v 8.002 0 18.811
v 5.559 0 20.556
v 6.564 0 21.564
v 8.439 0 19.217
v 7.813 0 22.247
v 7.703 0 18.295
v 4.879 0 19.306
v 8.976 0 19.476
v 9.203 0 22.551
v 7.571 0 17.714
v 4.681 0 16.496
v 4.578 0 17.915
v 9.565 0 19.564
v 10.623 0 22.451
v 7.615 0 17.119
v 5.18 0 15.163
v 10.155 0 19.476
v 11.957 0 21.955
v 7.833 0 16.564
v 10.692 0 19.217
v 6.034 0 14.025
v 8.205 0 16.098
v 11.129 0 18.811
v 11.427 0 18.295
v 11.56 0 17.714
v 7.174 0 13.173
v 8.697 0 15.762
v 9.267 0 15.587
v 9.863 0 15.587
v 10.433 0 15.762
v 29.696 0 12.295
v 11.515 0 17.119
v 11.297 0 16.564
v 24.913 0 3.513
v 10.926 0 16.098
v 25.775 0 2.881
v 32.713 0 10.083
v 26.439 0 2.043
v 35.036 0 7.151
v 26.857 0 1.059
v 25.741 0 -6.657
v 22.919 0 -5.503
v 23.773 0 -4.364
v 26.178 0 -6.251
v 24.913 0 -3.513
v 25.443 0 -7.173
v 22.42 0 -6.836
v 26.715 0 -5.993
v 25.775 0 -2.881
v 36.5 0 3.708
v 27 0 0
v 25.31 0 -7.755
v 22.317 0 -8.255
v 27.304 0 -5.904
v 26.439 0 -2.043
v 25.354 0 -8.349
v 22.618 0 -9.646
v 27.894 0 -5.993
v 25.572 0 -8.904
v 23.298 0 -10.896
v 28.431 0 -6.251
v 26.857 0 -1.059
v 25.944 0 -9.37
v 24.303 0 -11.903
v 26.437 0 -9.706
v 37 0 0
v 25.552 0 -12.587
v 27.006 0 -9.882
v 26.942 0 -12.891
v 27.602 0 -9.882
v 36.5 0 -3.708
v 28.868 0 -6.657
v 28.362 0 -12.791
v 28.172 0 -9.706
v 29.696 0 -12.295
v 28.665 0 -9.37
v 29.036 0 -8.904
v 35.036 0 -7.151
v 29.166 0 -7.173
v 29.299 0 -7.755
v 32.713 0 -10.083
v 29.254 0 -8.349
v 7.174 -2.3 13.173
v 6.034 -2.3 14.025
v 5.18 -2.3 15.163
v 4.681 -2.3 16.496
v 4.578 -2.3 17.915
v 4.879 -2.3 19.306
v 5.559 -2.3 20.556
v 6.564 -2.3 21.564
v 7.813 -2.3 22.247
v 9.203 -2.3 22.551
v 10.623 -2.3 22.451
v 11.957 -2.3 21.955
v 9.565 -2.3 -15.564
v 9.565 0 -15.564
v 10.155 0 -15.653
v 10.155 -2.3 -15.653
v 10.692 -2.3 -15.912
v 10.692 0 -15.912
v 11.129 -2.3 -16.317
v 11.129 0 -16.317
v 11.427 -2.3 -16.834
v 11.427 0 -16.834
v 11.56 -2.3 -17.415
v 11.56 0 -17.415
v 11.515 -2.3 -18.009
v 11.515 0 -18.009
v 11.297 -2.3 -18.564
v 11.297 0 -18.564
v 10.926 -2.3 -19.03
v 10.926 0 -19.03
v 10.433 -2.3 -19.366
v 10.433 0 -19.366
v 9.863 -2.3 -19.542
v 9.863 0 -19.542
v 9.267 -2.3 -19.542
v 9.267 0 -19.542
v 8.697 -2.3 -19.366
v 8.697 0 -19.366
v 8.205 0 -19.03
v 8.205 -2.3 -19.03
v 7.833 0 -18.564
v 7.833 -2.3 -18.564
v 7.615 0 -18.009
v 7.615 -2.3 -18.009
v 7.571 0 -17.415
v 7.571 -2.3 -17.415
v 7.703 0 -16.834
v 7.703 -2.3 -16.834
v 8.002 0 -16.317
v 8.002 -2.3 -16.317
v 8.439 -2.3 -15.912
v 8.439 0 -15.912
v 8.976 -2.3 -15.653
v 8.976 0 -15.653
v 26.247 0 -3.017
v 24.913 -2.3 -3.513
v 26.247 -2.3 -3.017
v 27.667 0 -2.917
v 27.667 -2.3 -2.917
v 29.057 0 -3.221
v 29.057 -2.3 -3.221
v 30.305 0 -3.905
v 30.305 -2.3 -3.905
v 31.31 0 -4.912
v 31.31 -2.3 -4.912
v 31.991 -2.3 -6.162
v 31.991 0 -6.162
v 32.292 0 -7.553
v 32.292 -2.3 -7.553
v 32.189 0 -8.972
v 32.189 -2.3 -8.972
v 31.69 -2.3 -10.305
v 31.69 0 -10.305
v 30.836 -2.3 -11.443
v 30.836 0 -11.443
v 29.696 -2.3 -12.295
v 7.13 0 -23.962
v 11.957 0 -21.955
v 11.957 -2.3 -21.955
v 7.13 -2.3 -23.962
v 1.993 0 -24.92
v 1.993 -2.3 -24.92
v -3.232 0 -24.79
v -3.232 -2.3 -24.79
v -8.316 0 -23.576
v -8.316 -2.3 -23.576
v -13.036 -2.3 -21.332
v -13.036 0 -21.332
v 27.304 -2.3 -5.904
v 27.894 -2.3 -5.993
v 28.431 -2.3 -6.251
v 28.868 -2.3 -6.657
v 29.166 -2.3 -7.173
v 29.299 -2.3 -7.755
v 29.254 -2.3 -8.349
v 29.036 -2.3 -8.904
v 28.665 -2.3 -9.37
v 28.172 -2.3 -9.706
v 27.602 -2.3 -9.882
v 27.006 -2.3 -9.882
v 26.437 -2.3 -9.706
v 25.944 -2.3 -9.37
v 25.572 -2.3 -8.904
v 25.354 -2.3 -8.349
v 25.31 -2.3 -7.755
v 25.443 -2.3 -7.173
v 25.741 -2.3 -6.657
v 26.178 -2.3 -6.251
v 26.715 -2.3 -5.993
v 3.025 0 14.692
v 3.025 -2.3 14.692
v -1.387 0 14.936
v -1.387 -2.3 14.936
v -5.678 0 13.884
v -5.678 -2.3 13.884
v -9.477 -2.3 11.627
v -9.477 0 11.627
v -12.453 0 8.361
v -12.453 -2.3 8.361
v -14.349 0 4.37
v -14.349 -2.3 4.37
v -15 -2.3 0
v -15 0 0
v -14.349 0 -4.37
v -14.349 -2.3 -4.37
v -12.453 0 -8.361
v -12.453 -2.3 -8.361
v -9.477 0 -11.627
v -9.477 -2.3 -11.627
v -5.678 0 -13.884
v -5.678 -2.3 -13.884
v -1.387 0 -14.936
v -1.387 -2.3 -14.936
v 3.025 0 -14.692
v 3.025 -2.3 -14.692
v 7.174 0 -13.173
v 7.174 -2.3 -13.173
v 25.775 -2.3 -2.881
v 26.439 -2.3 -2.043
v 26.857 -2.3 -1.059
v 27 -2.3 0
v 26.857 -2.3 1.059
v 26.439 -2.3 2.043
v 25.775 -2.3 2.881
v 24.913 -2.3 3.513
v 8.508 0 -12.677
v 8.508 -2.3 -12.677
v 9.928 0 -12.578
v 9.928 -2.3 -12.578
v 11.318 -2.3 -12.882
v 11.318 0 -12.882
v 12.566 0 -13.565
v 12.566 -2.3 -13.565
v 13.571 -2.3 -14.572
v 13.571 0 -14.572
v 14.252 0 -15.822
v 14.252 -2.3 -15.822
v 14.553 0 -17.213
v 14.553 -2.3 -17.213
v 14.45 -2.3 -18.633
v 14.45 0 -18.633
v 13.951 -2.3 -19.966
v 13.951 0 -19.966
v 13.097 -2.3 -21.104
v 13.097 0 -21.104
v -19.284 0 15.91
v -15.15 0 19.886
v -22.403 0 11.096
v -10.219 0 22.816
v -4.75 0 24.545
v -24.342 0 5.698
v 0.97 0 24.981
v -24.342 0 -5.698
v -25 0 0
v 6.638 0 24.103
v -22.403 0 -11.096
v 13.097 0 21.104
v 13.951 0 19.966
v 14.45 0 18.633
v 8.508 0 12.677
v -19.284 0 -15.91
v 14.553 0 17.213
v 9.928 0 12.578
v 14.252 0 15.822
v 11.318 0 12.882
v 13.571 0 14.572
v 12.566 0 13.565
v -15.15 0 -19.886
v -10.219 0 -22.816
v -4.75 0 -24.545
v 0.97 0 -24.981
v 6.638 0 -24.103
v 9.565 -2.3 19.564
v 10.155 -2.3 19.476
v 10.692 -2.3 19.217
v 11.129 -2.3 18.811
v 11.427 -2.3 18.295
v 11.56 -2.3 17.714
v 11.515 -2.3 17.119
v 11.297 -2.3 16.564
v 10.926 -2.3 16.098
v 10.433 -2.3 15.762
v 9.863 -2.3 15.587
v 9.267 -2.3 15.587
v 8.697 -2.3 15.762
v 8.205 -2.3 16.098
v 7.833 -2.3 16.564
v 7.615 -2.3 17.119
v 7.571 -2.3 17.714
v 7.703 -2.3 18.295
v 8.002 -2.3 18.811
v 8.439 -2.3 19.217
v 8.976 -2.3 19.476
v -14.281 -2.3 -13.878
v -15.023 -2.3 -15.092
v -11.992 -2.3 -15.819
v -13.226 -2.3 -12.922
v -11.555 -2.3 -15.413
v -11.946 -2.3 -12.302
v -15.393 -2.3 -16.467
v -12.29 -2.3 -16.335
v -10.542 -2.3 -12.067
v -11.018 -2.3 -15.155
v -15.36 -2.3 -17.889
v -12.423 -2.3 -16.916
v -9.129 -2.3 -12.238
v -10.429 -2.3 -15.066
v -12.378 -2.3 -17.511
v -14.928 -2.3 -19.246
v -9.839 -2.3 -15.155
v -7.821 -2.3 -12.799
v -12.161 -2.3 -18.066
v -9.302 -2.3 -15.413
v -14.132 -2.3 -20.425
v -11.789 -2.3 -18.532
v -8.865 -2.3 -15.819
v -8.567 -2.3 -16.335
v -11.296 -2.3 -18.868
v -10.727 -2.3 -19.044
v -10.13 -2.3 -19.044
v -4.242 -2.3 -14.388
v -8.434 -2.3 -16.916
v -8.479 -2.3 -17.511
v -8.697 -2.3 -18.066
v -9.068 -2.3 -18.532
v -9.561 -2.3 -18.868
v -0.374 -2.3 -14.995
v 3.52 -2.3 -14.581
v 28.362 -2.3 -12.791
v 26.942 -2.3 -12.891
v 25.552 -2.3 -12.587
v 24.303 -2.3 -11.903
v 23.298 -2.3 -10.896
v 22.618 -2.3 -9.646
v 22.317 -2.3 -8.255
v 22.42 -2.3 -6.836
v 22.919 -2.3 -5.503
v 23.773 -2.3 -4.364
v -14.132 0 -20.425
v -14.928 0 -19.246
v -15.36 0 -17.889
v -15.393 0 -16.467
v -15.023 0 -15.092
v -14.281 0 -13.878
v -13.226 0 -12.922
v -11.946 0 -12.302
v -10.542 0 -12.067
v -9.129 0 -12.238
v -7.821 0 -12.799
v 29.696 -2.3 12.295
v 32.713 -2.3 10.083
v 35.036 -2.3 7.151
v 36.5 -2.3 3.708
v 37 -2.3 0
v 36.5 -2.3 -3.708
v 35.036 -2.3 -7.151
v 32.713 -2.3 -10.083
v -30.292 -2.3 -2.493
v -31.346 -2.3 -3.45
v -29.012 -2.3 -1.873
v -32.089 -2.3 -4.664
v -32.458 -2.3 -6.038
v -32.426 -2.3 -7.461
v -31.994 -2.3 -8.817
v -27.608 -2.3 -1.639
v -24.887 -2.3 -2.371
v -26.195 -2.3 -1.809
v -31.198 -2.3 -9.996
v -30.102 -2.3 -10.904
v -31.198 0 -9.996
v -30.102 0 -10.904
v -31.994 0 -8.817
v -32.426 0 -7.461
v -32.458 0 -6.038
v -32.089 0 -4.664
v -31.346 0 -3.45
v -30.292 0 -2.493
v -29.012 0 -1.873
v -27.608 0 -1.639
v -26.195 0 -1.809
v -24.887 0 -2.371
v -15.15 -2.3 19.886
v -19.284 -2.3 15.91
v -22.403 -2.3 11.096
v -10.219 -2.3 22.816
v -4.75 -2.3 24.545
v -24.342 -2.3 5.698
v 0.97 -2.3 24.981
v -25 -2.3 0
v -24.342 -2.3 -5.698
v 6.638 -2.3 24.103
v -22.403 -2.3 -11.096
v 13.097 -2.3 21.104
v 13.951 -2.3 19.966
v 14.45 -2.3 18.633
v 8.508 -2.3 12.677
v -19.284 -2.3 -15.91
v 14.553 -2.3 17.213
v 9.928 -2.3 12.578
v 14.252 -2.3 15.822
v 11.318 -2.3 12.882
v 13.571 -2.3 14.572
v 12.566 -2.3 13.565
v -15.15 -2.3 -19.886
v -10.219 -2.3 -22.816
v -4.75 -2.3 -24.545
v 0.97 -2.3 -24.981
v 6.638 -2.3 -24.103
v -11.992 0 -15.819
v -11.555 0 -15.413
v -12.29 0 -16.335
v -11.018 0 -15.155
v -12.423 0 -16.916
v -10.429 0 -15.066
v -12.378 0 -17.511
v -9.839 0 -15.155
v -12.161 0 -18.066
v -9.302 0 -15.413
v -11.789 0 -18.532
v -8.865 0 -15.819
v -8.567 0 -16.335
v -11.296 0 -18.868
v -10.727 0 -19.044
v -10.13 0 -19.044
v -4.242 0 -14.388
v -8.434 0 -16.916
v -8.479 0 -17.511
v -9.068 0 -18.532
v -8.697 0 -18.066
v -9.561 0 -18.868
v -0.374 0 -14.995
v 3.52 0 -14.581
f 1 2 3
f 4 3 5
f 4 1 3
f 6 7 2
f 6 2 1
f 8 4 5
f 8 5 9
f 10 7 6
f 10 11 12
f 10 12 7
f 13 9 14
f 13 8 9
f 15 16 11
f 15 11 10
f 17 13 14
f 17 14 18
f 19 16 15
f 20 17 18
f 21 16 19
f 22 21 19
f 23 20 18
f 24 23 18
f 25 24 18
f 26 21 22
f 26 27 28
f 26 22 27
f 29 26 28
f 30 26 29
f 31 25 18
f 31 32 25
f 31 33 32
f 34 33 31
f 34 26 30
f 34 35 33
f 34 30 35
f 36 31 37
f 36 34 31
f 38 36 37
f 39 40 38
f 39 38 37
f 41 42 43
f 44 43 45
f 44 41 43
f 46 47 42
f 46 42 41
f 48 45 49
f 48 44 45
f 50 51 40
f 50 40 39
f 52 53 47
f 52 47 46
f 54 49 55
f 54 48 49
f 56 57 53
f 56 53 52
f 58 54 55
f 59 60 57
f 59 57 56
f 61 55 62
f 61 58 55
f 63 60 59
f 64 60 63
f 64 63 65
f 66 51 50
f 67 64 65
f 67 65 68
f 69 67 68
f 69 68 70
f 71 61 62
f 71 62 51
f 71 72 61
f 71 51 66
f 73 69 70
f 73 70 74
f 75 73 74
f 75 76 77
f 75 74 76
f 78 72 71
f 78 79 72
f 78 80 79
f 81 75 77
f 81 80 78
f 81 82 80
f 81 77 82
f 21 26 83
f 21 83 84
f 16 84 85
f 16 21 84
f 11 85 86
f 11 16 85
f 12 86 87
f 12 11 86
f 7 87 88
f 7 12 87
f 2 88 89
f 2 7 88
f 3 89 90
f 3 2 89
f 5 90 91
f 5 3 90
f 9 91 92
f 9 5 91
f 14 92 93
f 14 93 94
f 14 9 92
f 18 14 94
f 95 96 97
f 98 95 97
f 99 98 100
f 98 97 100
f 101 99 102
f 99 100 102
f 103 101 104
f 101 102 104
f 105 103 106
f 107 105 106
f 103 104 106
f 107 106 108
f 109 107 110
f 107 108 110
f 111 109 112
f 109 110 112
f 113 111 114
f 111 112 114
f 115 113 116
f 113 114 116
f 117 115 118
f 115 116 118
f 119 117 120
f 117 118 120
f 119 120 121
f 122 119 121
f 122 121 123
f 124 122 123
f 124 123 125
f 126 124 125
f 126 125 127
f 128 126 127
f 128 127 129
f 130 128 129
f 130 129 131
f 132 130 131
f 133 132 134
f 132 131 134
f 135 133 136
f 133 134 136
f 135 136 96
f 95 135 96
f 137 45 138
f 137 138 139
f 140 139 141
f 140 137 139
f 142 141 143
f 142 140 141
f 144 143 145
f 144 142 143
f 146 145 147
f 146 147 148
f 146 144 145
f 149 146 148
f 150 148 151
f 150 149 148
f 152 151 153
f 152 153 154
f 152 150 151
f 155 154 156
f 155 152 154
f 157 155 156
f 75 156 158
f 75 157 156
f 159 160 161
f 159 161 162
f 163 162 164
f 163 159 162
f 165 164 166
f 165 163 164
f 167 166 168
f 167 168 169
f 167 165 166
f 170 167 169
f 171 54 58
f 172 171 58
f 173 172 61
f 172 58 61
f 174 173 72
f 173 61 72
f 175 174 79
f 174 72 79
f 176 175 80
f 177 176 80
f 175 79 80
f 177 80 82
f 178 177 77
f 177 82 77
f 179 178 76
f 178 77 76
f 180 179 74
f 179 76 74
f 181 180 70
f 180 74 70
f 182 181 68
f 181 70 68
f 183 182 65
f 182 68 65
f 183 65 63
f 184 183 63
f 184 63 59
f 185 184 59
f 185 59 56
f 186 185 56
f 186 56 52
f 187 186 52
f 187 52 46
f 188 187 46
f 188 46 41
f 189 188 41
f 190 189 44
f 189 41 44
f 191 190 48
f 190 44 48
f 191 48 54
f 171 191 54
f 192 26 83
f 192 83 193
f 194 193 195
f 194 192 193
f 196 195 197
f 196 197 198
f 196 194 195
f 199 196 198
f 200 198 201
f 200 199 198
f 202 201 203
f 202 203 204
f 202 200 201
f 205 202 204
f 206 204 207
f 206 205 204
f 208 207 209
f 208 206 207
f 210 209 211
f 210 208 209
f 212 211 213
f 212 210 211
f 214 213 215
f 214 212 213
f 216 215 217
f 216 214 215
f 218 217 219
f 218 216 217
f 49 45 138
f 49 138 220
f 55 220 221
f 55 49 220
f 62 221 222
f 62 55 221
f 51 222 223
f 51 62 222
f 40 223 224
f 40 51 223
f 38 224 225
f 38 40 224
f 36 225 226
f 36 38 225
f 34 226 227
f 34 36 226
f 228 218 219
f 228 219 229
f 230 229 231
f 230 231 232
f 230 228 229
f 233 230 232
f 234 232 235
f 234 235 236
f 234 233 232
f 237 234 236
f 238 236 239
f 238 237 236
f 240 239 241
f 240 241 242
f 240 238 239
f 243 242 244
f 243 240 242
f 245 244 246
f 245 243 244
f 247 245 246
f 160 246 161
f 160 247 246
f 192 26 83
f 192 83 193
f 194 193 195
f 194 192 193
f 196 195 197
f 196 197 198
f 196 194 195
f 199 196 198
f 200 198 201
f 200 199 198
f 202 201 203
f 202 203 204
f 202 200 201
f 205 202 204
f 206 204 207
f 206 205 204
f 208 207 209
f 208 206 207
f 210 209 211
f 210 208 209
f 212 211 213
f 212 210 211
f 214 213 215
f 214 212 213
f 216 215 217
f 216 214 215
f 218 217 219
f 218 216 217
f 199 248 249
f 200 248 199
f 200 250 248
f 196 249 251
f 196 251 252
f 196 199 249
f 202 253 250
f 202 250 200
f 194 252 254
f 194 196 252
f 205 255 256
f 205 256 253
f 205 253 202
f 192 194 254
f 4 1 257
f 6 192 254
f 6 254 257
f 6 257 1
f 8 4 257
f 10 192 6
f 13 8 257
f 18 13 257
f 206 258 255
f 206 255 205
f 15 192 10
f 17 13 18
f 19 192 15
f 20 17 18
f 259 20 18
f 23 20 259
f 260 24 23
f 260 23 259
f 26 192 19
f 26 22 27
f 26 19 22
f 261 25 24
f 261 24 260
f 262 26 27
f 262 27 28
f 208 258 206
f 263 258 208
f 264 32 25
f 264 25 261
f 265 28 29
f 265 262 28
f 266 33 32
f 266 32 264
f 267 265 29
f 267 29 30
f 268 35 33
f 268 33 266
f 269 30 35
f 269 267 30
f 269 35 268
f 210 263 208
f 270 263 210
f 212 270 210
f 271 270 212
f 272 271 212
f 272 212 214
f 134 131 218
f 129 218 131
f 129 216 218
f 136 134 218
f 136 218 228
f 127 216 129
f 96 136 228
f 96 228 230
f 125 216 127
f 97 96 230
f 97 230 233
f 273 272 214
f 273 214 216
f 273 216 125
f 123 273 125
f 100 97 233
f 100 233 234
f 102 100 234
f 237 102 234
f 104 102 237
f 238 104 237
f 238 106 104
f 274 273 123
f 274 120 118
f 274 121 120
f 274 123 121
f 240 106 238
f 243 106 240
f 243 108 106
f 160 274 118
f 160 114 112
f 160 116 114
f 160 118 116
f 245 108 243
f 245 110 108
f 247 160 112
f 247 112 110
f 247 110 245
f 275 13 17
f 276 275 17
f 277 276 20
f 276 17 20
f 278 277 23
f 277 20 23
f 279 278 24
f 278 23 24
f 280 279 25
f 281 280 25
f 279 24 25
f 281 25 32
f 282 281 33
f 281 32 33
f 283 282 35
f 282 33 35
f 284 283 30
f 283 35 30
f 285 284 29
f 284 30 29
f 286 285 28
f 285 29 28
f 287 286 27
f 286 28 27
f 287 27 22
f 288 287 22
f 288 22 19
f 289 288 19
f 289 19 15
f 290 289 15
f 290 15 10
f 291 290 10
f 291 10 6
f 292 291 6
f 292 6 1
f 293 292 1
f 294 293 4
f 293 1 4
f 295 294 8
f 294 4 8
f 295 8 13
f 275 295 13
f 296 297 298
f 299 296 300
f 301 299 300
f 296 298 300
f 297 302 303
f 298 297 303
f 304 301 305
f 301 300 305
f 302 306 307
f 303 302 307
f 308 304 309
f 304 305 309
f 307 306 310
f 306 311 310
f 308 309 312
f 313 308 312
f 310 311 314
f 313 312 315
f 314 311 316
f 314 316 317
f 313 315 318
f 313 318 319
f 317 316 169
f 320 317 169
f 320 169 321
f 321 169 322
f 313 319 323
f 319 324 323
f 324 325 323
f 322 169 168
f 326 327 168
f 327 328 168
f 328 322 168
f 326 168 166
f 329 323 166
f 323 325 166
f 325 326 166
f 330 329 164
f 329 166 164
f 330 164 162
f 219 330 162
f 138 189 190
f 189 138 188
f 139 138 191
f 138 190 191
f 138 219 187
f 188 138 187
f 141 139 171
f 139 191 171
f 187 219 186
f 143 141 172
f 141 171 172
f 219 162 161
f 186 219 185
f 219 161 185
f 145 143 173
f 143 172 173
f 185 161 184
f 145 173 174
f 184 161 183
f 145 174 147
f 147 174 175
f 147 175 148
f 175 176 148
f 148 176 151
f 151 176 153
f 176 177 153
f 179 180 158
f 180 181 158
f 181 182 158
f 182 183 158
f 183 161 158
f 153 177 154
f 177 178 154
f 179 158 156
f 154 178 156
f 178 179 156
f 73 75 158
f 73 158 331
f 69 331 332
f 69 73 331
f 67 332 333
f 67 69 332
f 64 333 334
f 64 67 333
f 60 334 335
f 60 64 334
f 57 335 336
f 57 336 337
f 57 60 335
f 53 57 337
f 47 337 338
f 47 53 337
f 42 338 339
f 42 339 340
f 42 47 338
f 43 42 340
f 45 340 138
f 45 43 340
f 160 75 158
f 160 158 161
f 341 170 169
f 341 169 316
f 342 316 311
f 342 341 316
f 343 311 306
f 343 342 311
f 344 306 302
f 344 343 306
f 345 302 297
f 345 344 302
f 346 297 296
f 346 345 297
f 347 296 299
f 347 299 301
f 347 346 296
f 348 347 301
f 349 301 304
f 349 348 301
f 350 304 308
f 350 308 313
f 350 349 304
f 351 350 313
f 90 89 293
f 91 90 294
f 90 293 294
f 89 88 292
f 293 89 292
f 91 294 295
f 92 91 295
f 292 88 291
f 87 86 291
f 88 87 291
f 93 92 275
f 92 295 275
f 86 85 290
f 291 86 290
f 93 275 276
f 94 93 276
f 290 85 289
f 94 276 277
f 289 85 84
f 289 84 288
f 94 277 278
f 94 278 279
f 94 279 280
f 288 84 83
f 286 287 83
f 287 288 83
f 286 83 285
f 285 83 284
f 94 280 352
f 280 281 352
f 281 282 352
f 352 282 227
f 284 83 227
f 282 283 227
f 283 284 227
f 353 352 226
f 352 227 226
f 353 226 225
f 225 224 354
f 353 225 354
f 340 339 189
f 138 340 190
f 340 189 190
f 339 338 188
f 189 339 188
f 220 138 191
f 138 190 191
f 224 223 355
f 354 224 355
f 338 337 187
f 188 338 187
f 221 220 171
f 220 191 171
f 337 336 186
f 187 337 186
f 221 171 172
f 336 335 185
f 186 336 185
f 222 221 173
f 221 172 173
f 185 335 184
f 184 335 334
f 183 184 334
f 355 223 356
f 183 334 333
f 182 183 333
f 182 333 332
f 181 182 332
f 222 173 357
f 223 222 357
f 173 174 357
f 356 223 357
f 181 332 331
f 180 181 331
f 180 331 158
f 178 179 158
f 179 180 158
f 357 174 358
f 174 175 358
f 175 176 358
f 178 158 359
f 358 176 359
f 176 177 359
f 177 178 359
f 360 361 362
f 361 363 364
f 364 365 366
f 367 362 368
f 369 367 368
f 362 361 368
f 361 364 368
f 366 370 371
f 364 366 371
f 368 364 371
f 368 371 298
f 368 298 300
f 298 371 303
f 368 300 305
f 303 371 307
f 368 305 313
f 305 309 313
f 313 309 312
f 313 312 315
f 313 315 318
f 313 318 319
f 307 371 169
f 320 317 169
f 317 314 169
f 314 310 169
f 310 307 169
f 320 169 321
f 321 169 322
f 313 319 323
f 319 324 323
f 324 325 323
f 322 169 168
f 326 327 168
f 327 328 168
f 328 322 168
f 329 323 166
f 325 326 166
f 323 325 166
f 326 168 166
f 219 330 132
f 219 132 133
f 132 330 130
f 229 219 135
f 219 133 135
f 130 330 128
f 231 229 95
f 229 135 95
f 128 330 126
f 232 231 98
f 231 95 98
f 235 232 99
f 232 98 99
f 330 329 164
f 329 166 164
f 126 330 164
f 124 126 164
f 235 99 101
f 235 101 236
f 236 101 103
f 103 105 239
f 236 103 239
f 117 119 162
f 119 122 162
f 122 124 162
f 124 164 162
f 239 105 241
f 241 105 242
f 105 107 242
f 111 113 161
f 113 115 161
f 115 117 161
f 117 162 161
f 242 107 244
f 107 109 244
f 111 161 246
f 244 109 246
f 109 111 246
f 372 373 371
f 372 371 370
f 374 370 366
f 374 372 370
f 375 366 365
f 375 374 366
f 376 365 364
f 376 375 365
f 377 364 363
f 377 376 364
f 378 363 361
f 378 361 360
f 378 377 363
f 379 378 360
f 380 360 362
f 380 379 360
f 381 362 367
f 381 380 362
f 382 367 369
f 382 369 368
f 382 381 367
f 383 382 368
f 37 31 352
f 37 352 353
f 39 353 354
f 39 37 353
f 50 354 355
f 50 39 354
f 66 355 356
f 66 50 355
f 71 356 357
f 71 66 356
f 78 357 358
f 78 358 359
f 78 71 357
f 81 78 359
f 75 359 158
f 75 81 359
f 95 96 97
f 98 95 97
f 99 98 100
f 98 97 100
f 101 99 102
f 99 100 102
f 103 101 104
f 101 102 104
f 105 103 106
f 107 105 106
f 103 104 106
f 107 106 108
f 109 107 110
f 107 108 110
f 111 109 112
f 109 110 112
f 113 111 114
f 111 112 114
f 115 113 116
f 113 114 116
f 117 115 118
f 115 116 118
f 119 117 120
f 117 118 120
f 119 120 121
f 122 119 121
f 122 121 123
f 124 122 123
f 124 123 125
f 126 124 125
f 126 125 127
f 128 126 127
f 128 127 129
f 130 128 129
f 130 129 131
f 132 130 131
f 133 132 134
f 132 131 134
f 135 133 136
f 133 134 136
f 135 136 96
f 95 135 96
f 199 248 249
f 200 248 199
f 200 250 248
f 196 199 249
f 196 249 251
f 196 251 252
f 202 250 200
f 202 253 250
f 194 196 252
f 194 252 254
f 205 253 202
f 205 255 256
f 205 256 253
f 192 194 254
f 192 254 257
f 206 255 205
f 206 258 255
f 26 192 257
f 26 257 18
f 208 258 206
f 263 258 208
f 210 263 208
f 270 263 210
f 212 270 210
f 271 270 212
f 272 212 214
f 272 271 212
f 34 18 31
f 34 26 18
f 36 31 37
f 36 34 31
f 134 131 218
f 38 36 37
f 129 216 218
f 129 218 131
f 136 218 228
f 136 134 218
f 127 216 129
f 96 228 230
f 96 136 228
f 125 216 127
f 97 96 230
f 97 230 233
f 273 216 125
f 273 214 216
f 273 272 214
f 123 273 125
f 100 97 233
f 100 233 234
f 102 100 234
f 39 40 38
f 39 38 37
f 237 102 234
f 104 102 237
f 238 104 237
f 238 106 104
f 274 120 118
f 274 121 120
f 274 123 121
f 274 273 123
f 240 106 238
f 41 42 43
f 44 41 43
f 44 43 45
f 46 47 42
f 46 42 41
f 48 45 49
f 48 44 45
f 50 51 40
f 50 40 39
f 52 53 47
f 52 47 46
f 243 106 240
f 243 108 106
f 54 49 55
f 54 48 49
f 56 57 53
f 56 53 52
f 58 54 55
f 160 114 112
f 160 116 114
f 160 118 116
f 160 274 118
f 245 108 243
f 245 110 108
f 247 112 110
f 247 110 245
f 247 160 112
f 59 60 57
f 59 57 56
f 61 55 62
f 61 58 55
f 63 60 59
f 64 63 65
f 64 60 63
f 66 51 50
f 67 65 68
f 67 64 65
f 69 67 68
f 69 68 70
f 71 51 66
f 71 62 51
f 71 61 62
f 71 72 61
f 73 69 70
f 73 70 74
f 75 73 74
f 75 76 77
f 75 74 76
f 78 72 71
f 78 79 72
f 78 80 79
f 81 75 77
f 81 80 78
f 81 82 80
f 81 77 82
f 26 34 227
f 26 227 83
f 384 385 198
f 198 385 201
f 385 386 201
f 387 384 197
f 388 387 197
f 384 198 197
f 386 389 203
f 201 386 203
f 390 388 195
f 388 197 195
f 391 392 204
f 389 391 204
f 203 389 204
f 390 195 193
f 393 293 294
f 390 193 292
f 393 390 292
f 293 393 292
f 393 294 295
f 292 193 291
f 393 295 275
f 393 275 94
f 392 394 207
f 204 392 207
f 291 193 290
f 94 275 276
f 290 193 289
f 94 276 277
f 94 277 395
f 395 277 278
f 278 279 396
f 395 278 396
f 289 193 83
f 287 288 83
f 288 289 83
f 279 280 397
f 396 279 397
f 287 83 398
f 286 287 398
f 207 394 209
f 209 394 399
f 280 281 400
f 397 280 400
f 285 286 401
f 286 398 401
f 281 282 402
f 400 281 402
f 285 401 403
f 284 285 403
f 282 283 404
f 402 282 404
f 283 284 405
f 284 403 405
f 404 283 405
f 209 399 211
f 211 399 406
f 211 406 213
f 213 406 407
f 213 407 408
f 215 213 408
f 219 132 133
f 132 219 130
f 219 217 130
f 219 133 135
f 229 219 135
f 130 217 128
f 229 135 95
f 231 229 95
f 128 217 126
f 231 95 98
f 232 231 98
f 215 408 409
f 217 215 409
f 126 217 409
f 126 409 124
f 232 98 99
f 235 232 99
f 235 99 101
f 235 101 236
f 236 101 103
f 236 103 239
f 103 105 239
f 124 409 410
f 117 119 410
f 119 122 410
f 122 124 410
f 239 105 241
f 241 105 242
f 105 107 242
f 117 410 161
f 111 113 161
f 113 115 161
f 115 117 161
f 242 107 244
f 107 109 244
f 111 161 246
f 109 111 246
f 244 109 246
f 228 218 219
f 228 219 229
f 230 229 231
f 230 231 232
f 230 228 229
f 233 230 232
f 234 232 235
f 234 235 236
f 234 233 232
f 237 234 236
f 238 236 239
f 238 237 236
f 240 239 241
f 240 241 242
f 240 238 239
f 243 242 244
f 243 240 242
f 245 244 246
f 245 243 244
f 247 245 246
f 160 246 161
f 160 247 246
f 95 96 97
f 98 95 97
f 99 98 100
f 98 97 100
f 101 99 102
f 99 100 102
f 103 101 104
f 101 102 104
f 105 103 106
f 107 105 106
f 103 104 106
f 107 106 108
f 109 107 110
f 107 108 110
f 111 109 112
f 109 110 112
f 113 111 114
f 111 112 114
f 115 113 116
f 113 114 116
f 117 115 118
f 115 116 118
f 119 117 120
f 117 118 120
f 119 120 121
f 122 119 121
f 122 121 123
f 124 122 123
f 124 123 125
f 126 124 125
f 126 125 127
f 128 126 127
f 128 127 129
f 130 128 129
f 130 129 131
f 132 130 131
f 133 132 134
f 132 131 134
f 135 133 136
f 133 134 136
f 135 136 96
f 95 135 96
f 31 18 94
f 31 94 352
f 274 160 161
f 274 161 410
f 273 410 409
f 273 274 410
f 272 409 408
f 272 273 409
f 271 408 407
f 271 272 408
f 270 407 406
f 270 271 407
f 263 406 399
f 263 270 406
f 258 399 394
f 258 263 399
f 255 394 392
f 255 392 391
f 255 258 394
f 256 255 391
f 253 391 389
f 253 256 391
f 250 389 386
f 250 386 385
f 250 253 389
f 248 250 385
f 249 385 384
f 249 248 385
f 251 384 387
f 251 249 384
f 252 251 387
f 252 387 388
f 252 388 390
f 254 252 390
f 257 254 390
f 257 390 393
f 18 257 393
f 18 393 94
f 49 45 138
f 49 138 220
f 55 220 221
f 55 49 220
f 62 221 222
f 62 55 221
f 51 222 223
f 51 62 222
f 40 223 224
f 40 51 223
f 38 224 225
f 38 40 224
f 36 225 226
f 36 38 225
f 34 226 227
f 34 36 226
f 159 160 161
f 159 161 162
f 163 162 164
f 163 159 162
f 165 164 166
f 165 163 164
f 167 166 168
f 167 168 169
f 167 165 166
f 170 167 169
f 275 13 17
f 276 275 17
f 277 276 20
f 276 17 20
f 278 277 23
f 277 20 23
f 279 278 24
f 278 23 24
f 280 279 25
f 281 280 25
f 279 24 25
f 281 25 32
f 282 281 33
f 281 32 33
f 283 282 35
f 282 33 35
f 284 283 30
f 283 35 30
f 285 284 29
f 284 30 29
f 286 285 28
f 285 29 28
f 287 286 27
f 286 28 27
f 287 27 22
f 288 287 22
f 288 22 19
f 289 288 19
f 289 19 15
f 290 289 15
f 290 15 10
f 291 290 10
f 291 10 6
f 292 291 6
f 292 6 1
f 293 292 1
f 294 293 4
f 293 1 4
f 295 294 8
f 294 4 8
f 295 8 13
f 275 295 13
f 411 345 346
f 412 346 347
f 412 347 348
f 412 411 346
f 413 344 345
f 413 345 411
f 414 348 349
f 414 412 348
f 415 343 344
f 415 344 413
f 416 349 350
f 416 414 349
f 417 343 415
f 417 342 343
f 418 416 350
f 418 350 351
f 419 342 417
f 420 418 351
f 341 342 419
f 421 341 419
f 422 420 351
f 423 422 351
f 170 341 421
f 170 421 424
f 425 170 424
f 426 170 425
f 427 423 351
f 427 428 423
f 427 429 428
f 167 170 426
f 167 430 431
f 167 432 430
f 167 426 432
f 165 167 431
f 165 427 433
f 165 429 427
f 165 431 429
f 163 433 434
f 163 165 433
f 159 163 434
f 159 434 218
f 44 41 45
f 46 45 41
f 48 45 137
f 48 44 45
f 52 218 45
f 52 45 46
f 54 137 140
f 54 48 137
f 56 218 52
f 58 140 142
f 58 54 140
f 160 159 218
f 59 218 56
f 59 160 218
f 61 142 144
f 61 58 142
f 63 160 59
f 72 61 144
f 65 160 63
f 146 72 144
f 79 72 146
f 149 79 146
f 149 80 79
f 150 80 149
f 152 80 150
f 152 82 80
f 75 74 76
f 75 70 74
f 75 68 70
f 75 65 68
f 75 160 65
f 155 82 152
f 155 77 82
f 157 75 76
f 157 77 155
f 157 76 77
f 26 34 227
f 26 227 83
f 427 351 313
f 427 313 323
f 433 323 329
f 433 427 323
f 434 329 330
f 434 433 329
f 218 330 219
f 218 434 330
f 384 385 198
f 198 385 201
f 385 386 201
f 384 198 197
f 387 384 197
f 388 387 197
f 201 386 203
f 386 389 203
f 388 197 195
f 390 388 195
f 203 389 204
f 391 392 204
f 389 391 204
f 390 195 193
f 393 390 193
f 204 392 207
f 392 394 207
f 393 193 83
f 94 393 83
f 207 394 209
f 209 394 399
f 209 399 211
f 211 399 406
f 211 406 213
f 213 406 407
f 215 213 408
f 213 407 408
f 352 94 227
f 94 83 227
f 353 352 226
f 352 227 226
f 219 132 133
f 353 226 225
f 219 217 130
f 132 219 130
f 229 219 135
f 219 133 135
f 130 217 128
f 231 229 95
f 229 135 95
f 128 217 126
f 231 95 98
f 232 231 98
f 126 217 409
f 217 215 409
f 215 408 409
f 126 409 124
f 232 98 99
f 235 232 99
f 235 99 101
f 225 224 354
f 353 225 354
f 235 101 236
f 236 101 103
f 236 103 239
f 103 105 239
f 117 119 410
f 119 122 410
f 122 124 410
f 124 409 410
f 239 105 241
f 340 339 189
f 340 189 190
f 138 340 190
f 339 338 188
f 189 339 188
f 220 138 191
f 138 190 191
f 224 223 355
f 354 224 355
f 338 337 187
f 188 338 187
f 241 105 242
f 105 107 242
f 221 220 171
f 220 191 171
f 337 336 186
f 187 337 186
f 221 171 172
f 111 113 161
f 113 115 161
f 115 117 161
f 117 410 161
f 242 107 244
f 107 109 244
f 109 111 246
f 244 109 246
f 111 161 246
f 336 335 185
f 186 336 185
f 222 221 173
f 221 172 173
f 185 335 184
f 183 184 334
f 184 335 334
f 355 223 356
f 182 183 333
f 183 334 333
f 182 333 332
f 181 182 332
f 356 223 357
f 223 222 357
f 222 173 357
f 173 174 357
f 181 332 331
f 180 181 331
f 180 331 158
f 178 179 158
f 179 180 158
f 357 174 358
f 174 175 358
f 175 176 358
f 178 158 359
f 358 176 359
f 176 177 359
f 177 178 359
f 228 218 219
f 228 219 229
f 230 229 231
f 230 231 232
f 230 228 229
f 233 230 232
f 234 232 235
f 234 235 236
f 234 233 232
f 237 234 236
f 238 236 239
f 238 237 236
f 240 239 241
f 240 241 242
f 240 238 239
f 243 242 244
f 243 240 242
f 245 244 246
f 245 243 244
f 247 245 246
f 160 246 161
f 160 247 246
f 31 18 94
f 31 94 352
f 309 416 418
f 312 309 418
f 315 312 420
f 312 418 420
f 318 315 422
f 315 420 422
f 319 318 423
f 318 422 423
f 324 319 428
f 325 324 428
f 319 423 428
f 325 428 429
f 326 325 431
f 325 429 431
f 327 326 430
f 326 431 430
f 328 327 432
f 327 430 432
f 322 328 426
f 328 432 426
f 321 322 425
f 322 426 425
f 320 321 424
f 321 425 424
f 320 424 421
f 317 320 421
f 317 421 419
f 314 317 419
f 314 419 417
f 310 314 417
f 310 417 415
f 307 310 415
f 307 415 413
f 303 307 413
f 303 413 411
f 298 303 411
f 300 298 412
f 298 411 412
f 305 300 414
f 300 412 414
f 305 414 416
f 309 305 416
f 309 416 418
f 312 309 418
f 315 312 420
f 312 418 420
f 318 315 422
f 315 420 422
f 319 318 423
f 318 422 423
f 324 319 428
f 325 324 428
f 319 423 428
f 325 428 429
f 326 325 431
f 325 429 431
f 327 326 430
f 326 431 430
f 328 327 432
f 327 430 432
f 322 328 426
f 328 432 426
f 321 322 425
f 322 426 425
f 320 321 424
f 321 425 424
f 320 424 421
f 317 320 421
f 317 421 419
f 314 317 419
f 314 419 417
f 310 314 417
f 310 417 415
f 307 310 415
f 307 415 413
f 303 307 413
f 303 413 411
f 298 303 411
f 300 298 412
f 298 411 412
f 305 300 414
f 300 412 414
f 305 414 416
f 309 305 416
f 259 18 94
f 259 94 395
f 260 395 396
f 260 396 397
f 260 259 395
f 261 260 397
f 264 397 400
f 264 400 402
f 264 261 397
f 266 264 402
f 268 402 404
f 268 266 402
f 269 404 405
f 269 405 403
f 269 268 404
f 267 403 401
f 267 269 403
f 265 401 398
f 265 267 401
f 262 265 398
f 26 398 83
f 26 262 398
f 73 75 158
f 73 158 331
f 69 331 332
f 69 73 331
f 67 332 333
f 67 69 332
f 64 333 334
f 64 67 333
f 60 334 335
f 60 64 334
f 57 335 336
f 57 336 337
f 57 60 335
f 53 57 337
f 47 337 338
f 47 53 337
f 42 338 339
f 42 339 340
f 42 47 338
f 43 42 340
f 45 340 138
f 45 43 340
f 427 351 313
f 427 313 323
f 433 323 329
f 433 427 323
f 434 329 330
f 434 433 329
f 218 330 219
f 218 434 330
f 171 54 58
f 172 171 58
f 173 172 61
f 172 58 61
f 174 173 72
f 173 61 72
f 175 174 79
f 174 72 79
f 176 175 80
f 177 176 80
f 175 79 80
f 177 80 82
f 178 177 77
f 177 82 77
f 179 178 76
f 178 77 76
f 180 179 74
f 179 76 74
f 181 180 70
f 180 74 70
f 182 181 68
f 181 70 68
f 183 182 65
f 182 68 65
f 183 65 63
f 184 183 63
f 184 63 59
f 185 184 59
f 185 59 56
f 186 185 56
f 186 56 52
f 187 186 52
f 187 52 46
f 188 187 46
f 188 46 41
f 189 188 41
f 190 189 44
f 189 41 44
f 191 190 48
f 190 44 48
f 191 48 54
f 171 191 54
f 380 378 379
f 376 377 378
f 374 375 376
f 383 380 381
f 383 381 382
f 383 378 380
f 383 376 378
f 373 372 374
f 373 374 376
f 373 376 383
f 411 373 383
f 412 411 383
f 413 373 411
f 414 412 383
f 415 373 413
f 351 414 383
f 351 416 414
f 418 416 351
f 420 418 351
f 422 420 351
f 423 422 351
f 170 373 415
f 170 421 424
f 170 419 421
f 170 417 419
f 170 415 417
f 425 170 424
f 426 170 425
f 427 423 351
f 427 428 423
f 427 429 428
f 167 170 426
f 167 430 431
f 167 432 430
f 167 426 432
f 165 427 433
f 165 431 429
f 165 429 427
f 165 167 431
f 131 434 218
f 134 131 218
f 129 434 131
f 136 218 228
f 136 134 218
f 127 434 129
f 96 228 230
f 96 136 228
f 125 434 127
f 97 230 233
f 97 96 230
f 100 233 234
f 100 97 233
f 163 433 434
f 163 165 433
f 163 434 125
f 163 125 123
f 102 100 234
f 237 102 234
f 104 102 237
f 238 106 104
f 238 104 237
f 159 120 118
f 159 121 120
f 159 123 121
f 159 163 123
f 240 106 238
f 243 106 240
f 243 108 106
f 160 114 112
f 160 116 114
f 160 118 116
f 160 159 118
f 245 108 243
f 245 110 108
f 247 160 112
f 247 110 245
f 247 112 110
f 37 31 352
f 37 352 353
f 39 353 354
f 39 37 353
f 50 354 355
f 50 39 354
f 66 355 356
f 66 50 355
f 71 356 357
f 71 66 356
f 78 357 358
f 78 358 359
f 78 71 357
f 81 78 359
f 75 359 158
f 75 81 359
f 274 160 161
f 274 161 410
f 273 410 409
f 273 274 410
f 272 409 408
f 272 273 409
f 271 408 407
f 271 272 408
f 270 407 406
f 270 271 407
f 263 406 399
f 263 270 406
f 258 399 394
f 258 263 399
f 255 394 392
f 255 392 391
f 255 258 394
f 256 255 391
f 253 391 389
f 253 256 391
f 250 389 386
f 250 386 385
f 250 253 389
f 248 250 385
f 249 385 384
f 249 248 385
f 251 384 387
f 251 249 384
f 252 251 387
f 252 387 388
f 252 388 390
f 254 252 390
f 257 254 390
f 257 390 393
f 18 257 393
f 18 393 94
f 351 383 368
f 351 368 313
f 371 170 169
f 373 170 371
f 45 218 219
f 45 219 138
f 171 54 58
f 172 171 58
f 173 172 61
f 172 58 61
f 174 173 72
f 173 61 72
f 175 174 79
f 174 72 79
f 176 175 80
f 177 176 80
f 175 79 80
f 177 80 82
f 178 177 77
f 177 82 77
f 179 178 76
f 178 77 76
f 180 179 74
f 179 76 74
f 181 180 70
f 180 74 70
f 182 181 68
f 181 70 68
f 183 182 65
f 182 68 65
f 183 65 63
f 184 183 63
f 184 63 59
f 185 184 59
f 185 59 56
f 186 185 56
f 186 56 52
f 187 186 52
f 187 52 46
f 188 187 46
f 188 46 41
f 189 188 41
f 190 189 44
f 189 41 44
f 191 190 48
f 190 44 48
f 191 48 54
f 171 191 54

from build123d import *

# Parameters (mm, degrees)
SKETCH8_R          = 2
BASE_FLANGE2_DEPTH = 2.3
SKETCH14_R         = 2
BASE_FLANGE4_DEPTH = 2.3
SKETCH17_R         = 2
BASE_FLANGE5_DEPTH = 2.3
SKETCH11_R         = 2
BASE_FLANGE6_DEPTH = 2.3
SKETCH23_R         = 2
BASE_FLANGE7_DEPTH = 2.3


# Sheet-metal steps are written as plain solids
with BuildPart() as part:
    # Sketch8 → Base-Flange2 (new body)
    with BuildSketch(Plane(origin=(0, 0, 0), x_dir=(1, 0, 0), z_dir=(0, 1, 0))):
        with BuildLine():
            ThreePointArc((11.956521739, 21.955445518), (-25, 0), (11.956521739, -21.955445518))
            ThreePointArc((11.956521739, -21.955445518), (13.956306495, -15.173052067), (7.173913043, -13.173267311))
            ThreePointArc((7.173913043, -13.173267311), (-15, 0), (7.173913043, 13.173267311))
            ThreePointArc((7.173913043, 13.173267311), (13.956306495, 15.173052067), (11.956521739, 21.955445518))
        make_face()
        with Locations(Location((9.565217391, 17.564356415, 0), (0, 0, 270))):
            Circle(SKETCH8_R, mode=Mode.SUBTRACT)
        with Locations(Location((9.565217391, -17.564356415, 0), (0, 0, 270))):
            Circle(SKETCH8_R, mode=Mode.SUBTRACT)
    extrude(amount=-BASE_FLANGE2_DEPTH)


with BuildPart() as body_2:
    # Sketch14 → Base-Flange4 (new body)
    with BuildSketch(Plane(origin=(0, 0, 0), x_dir=(1, 0, 0), z_dir=(0, 1, 0))):
        with BuildLine():
            Line((29.695652174, 12.29504949), (11.956521739, 21.955445518))
            ThreePointArc((11.956521739, 21.955445518), (-0.623071192, 24.99223444), (-13.035712701, 21.332374326))
            ThreePointArc((-13.035712701, 21.332374326), (-14.695045026, 14.458756921), (-7.82142762, 12.799424596))
            ThreePointArc((-7.82142762, 12.799424596), (-0.373842715, 14.995340664), (7.173913043, 13.173267311))
            Line((7.173913043, 13.173267311), (24.913043478, 3.512871283))
            ThreePointArc((24.913043478, 3.512871283), (31.69543693, 5.512656039), (29.695652174, 12.29504949))
        make_face()
        with Locations(Location((-10.42857016, 17.065899461, 0), (0, 0, 270))):
            Circle(SKETCH14_R, mode=Mode.SUBTRACT)
        with Locations(Location((27.304347826, 7.903960387, 0), (0, 0, 270))):
            Circle(SKETCH14_R, mode=Mode.SUBTRACT)
    extrude(amount=-BASE_FLANGE4_DEPTH)


with BuildPart() as body_3:
    # Sketch17 → Base-Flange5 (new body)
    with BuildSketch(Plane(origin=(0, 0, 0), x_dir=(1, 0, 0), z_dir=(0, 1, 0))):
        with BuildLine():
            Line((-13.035712701, 21.332374326), (-30.101612161, 10.903804166))
            ThreePointArc((-30.101612161, 10.903804166), (-31.760944487, 4.03018676), (-24.887327081, 2.370854435))
            Line((-24.887327081, 2.370854435), (-7.82142762, 12.799424596))
            ThreePointArc((-7.82142762, 12.799424596), (-0.373842715, 14.995340664), (7.173913043, 13.173267311))
            ThreePointArc((7.173913043, 13.173267311), (13.956306495, 15.173052067), (11.956521739, 21.955445518))
            ThreePointArc((11.956521739, 21.955445518), (-0.623071192, 24.99223444), (-13.035712701, 21.332374326))
        make_face()
        with Locations(Location((9.565217391, 17.564356415, 0), (0, 0, 270))):
            Circle(SKETCH17_R, mode=Mode.SUBTRACT)
        with Locations(Location((-10.42857016, 17.065899461, 0), (0, 0, 270))):
            Circle(SKETCH17_R, mode=Mode.SUBTRACT)
    extrude(amount=-BASE_FLANGE5_DEPTH)


with BuildPart() as body_4:
    # Sketch11 → Base-Flange6 (new body)
    with BuildSketch(Plane(origin=(0, 0, 0), x_dir=(1, 0, 0), z_dir=(0, 1, 0))):
        with BuildLine():
            Line((11.956521739, -21.955445518), (29.695652174, -12.29504949))
            ThreePointArc((29.695652174, -12.29504949), (37, 0), (29.695652174, 12.29504949))
            ThreePointArc((29.695652174, 12.29504949), (22.913258722, 10.295264734), (24.913043478, 3.512871283))
            ThreePointArc((24.913043478, 3.512871283), (27, 0), (24.913043478, -3.512871283))
            Line((24.913043478, -3.512871283), (7.173913043, -13.173267311))
            ThreePointArc((7.173913043, -13.173267311), (5.174128288, -19.955660762), (11.956521739, -21.955445518))
        make_face()
        with Locations(Location((27.304347826, 7.903960387, 0), (0, 0, 270))):
            Circle(SKETCH11_R, mode=Mode.SUBTRACT)
        with Locations(Location((9.565217391, -17.564356415, 0), (0, 0, 270))):
            Circle(SKETCH11_R, mode=Mode.SUBTRACT)
    extrude(amount=-BASE_FLANGE6_DEPTH)


with BuildPart() as body_5:
    # Sketch23 → Base-Flange7 (new body)
    with BuildSketch(Plane(origin=(0, 0, 0), x_dir=(1, 0, 0), z_dir=(0, 1, 0))):
        with BuildLine():
            Line((11.956521739, -21.955445518), (29.695652174, -12.29504949))
            ThreePointArc((29.695652174, -12.29504949), (37, 0), (29.695652174, 12.29504949))
            ThreePointArc((29.695652174, 12.29504949), (22.913258722, 10.295264734), (24.913043478, 3.512871283))
            ThreePointArc((24.913043478, 3.512871283), (27, 0), (24.913043478, -3.512871283))
            Line((24.913043478, -3.512871283), (7.173913043, -13.173267311))
            ThreePointArc((7.173913043, -13.173267311), (-15, 0), (7.173913043, 13.173267311))
            ThreePointArc((7.173913043, 13.173267311), (13.956306495, 15.173052067), (11.956521739, 21.955445518))
            ThreePointArc((11.956521739, 21.955445518), (-25, 0), (11.956521739, -21.955445518))
        make_face()
        with Locations(Location((9.565217391, 17.564356415, 0), (0, 0, 270))):
            Circle(SKETCH23_R, mode=Mode.SUBTRACT)
        with Locations(Location((27.304347826, 7.903960387, 0), (0, 0, 270))):
            Circle(SKETCH23_R, mode=Mode.SUBTRACT)
    extrude(amount=-BASE_FLANGE7_DEPTH)


solid = Compound([part.part, body_2.part, body_3.part, body_4.part, body_5.part])
